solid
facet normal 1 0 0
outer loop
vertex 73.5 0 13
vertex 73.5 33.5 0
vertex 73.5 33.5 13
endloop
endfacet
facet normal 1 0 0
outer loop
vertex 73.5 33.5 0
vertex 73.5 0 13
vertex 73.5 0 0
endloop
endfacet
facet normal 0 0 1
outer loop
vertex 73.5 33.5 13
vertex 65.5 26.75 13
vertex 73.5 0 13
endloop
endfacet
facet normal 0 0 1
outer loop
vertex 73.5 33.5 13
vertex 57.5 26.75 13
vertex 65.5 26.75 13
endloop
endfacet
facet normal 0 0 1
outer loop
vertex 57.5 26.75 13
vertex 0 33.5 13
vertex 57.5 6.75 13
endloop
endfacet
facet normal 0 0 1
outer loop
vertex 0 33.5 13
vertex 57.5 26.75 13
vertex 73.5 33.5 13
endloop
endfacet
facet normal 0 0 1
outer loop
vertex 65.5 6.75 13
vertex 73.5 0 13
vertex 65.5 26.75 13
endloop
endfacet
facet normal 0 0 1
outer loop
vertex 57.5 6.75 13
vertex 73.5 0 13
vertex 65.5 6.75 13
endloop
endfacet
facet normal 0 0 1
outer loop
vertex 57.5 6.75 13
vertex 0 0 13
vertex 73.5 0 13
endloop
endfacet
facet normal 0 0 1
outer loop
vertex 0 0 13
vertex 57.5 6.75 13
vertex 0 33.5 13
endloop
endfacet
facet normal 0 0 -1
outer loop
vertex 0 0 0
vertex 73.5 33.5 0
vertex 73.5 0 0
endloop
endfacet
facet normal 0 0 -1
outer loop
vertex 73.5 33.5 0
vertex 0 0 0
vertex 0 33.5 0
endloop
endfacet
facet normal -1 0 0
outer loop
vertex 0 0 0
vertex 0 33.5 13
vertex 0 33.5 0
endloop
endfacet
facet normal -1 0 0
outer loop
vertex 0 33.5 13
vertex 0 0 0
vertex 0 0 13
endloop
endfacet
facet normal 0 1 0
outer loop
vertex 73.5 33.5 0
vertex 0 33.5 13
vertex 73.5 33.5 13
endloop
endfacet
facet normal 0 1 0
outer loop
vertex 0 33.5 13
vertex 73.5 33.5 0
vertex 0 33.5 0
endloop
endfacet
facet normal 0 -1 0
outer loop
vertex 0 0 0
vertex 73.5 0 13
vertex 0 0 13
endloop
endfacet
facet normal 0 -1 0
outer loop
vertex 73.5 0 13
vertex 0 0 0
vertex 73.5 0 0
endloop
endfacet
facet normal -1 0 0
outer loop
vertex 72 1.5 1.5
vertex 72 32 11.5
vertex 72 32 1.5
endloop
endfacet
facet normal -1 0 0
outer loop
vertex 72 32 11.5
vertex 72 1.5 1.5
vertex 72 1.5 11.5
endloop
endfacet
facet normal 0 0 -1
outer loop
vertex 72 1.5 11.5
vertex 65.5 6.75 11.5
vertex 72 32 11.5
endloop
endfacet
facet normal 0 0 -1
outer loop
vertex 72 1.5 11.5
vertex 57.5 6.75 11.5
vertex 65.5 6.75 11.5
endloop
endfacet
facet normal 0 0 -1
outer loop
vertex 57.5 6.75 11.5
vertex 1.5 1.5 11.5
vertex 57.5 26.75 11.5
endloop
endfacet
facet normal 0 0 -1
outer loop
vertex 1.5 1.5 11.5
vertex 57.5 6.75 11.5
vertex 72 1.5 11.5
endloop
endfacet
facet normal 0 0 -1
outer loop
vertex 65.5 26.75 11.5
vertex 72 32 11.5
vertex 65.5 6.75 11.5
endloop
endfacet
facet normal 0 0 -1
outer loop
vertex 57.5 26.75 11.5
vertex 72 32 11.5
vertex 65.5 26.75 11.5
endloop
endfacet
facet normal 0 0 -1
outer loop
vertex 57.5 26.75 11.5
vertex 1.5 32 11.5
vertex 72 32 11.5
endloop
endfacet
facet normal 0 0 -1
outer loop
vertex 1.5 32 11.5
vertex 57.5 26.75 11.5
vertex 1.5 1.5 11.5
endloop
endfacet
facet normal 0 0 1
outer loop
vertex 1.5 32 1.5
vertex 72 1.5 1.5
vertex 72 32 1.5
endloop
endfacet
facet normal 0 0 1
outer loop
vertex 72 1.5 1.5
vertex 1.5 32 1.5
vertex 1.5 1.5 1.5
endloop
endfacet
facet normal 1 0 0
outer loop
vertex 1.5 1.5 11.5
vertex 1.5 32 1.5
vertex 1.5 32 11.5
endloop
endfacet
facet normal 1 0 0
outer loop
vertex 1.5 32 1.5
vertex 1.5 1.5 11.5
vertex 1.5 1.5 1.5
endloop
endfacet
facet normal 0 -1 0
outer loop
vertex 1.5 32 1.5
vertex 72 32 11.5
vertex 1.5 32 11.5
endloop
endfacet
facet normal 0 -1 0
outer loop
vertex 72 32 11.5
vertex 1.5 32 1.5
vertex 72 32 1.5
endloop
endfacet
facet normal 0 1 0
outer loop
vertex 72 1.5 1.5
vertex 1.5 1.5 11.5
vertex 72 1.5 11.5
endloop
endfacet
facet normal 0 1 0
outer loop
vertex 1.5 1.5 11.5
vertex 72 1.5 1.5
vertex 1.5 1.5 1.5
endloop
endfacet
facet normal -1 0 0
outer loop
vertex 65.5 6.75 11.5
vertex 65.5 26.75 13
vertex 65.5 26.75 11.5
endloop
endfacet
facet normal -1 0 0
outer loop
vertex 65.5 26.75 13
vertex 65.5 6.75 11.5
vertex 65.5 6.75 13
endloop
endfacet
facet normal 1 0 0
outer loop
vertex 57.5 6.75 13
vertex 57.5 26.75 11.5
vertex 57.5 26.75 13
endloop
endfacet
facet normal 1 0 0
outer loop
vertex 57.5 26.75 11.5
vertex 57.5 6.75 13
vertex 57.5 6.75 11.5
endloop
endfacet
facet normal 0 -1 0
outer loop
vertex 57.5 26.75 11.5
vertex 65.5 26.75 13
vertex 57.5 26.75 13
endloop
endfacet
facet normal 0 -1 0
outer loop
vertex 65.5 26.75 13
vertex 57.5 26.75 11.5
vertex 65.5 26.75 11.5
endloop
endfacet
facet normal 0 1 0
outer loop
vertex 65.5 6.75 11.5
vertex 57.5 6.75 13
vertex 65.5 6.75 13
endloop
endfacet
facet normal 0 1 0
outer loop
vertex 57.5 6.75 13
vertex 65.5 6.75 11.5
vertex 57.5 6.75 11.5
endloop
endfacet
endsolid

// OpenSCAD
// Settings
PCB_WIDTH = 70 + 0.5;
PCB_HEIGHT = 30 + 0.5;
PCB_DEPTH = 10;
WALLS = 1.5;

difference() {
  // Case shape
  cube([
    PCB_WIDTH + (WALLS * 2), PCB_HEIGHT + (WALLS * 2), PCB_DEPTH + (WALLS * 2)
  ]);

  // Cutout for PCB
  translate([ WALLS, WALLS, WALLS ]) {
    cube([ PCB_WIDTH, PCB_HEIGHT, PCB_DEPTH ]);
  };

  // Cut an opening for the button
  translate([ WALLS + 56, WALLS+ (PCB_HEIGHT/2)-(10), WALLS ]) {
    cube([ 8, 20, 50 ]);
  }
}
